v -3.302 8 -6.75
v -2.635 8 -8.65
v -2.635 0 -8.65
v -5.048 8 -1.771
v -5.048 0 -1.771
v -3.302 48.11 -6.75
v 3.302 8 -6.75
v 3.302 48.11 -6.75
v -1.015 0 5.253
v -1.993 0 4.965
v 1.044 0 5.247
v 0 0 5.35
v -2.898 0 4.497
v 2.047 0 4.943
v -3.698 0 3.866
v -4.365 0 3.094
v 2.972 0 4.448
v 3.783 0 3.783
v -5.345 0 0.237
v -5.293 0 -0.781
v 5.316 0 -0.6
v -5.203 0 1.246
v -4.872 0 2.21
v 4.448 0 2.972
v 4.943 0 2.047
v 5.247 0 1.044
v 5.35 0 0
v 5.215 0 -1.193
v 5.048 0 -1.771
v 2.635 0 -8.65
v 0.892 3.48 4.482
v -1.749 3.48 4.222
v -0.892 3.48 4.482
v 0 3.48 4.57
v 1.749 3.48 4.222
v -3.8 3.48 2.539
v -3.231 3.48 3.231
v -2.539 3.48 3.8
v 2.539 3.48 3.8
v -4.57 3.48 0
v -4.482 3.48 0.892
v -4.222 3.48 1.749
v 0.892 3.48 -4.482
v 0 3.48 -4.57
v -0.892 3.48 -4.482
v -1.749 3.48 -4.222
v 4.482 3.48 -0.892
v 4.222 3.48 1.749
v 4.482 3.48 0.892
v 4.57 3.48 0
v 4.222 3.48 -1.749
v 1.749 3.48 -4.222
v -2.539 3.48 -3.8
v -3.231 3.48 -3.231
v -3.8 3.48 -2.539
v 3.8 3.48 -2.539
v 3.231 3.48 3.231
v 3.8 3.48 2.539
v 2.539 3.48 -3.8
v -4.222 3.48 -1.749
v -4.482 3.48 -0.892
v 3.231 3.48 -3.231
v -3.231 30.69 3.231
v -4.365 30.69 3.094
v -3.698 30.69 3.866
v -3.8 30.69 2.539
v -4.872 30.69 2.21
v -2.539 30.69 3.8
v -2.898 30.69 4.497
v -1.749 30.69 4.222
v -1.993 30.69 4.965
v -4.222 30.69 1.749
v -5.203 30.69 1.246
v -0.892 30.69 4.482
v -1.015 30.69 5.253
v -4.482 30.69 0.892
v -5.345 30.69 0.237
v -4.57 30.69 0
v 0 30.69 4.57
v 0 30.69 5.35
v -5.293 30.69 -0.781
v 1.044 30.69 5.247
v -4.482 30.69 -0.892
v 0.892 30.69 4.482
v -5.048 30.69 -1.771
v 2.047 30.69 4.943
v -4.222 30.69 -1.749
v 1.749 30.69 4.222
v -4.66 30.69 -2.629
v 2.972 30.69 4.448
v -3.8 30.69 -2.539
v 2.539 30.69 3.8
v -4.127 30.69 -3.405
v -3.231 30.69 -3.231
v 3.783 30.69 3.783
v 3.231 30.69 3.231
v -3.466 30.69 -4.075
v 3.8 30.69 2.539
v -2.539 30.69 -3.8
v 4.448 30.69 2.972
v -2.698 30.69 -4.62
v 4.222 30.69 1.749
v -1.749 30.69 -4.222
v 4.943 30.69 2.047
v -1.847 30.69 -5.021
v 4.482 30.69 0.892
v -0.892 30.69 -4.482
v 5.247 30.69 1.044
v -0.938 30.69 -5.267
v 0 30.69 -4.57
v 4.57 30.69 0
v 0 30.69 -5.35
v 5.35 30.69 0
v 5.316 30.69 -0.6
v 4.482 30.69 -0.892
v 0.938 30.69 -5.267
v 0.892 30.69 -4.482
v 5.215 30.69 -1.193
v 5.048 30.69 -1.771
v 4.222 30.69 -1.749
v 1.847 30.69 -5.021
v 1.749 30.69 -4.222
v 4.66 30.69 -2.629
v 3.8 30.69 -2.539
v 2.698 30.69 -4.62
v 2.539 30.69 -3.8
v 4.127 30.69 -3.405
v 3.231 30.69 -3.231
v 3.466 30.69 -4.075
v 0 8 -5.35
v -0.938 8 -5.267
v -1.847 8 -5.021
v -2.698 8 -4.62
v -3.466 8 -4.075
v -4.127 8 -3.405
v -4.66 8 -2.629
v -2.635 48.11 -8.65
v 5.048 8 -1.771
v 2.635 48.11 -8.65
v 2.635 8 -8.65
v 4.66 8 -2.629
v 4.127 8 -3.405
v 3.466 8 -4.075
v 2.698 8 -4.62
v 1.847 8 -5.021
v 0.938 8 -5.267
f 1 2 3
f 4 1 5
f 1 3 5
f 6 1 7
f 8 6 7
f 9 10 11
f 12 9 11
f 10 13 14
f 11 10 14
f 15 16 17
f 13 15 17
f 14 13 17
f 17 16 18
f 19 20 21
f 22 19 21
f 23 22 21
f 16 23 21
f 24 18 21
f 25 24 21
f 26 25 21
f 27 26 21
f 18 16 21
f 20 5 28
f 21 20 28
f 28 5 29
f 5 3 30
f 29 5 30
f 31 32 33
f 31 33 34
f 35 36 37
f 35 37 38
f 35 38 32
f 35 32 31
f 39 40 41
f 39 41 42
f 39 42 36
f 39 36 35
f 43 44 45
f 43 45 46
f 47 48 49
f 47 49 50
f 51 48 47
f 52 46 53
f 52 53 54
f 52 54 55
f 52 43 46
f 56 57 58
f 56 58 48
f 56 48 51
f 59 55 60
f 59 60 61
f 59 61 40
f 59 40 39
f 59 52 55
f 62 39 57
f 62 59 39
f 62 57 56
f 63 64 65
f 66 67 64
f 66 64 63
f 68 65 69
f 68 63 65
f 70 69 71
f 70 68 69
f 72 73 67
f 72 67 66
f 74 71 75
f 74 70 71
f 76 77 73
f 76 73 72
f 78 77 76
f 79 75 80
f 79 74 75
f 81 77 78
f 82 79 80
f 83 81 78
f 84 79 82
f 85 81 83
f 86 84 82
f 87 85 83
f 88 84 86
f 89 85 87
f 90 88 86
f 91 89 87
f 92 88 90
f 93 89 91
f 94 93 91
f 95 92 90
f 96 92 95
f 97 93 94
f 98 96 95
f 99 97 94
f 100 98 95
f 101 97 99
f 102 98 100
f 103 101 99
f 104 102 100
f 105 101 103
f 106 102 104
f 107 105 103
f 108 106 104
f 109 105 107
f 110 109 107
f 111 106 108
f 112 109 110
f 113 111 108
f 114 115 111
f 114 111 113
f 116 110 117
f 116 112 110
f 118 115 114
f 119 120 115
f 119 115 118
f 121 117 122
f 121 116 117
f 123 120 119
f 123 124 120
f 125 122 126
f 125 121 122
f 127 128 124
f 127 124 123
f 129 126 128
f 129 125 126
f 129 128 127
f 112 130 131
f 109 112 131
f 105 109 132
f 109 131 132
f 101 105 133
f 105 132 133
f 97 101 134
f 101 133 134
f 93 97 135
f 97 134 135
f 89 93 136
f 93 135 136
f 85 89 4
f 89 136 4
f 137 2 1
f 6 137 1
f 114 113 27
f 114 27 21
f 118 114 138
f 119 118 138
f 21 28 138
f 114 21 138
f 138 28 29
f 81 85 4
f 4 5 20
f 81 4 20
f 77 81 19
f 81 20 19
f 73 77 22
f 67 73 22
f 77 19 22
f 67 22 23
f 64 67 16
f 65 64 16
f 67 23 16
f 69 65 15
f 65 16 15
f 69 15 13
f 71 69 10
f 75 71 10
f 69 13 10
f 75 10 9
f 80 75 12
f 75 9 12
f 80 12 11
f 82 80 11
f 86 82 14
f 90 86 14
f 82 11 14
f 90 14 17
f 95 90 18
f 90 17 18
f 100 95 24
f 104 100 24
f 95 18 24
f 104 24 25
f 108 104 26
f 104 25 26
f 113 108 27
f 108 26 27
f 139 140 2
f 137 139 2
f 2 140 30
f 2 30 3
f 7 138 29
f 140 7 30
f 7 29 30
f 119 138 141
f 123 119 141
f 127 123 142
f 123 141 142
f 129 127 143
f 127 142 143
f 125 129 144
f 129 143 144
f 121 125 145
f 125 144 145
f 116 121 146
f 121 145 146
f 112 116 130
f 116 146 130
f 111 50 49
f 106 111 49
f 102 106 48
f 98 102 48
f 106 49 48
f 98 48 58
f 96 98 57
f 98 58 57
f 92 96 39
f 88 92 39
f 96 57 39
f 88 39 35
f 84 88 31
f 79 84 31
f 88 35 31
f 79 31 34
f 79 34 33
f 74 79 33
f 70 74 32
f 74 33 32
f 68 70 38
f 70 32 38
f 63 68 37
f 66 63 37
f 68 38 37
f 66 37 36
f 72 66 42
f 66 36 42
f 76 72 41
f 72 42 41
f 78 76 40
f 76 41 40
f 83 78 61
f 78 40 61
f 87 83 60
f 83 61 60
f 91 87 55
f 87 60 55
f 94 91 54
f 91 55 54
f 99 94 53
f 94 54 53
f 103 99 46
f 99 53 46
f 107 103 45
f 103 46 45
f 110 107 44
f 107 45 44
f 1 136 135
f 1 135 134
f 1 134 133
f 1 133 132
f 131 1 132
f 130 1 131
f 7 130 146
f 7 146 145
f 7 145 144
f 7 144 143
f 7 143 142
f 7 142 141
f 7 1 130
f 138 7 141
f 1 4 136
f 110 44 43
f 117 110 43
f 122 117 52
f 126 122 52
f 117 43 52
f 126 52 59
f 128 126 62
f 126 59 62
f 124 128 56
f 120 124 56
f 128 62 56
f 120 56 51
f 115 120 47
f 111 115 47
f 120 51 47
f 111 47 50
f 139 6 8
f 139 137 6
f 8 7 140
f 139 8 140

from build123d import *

# Parameters (mm, degrees)
SKETCH3_R           = 5.35
SKETCH3_R_2         = 4.57
BOSS_EXTRUDE1_DEPTH = 30.69
BOSS_EXTRUDE2_DEPTH = 8
BOSS_EXTRUDE3_DEPTH = 40.11
SKETCH3_6_R         = 4.57
BOSS_EXTRUDE4_DEPTH = 3.48


with BuildPart() as part:
    # Sketch3 → Boss-Extrude1 (new body)
    with BuildSketch(Plane(origin=(0, 0, 0), x_dir=(1, 0, 0), z_dir=(0, 1, 0))):
        Circle(SKETCH3_R)
        Circle(SKETCH3_R_2, mode=Mode.SUBTRACT)
    extrude(amount=BOSS_EXTRUDE1_DEPTH)

    # Sketch3<5> → Boss-Extrude2 (add)
    with BuildSketch(Plane(origin=(0, 0, 0), x_dir=(1, 0, 0), z_dir=(0, 1, 0))):
        with BuildLine():
            Line((-2.635, 8.65), (-5.048331501, 1.771115202))
            ThreePointArc((-5.048331501, 1.771115202), (0, 5.35), (5.048331501, 1.771115202))
            Line((5.048331501, 1.771115202), (2.635, 8.65))
            Line((2.635, 8.65), (-2.635, 8.65))
        make_face()
    extrude(amount=BOSS_EXTRUDE2_DEPTH)

    # Sketch5 → Boss-Extrude3 (add)
    with BuildSketch(Plane(origin=(0, 8, 0), x_dir=(1, 0, 0), z_dir=(0, 1, 0))):
        Polygon((-3.30158041, 6.75), (3.30158041, 6.75), (2.635, 8.65), (-2.635, 8.65), align=None)
    extrude(amount=BOSS_EXTRUDE3_DEPTH)

    # Sketch3<6> → Boss-Extrude4 (add)
    with BuildSketch(Plane(origin=(0, 0, 0), x_dir=(1, 0, 0), z_dir=(0, 1, 0))):
        Circle(SKETCH3_6_R)
    extrude(amount=BOSS_EXTRUDE4_DEPTH)


solid = part.part
